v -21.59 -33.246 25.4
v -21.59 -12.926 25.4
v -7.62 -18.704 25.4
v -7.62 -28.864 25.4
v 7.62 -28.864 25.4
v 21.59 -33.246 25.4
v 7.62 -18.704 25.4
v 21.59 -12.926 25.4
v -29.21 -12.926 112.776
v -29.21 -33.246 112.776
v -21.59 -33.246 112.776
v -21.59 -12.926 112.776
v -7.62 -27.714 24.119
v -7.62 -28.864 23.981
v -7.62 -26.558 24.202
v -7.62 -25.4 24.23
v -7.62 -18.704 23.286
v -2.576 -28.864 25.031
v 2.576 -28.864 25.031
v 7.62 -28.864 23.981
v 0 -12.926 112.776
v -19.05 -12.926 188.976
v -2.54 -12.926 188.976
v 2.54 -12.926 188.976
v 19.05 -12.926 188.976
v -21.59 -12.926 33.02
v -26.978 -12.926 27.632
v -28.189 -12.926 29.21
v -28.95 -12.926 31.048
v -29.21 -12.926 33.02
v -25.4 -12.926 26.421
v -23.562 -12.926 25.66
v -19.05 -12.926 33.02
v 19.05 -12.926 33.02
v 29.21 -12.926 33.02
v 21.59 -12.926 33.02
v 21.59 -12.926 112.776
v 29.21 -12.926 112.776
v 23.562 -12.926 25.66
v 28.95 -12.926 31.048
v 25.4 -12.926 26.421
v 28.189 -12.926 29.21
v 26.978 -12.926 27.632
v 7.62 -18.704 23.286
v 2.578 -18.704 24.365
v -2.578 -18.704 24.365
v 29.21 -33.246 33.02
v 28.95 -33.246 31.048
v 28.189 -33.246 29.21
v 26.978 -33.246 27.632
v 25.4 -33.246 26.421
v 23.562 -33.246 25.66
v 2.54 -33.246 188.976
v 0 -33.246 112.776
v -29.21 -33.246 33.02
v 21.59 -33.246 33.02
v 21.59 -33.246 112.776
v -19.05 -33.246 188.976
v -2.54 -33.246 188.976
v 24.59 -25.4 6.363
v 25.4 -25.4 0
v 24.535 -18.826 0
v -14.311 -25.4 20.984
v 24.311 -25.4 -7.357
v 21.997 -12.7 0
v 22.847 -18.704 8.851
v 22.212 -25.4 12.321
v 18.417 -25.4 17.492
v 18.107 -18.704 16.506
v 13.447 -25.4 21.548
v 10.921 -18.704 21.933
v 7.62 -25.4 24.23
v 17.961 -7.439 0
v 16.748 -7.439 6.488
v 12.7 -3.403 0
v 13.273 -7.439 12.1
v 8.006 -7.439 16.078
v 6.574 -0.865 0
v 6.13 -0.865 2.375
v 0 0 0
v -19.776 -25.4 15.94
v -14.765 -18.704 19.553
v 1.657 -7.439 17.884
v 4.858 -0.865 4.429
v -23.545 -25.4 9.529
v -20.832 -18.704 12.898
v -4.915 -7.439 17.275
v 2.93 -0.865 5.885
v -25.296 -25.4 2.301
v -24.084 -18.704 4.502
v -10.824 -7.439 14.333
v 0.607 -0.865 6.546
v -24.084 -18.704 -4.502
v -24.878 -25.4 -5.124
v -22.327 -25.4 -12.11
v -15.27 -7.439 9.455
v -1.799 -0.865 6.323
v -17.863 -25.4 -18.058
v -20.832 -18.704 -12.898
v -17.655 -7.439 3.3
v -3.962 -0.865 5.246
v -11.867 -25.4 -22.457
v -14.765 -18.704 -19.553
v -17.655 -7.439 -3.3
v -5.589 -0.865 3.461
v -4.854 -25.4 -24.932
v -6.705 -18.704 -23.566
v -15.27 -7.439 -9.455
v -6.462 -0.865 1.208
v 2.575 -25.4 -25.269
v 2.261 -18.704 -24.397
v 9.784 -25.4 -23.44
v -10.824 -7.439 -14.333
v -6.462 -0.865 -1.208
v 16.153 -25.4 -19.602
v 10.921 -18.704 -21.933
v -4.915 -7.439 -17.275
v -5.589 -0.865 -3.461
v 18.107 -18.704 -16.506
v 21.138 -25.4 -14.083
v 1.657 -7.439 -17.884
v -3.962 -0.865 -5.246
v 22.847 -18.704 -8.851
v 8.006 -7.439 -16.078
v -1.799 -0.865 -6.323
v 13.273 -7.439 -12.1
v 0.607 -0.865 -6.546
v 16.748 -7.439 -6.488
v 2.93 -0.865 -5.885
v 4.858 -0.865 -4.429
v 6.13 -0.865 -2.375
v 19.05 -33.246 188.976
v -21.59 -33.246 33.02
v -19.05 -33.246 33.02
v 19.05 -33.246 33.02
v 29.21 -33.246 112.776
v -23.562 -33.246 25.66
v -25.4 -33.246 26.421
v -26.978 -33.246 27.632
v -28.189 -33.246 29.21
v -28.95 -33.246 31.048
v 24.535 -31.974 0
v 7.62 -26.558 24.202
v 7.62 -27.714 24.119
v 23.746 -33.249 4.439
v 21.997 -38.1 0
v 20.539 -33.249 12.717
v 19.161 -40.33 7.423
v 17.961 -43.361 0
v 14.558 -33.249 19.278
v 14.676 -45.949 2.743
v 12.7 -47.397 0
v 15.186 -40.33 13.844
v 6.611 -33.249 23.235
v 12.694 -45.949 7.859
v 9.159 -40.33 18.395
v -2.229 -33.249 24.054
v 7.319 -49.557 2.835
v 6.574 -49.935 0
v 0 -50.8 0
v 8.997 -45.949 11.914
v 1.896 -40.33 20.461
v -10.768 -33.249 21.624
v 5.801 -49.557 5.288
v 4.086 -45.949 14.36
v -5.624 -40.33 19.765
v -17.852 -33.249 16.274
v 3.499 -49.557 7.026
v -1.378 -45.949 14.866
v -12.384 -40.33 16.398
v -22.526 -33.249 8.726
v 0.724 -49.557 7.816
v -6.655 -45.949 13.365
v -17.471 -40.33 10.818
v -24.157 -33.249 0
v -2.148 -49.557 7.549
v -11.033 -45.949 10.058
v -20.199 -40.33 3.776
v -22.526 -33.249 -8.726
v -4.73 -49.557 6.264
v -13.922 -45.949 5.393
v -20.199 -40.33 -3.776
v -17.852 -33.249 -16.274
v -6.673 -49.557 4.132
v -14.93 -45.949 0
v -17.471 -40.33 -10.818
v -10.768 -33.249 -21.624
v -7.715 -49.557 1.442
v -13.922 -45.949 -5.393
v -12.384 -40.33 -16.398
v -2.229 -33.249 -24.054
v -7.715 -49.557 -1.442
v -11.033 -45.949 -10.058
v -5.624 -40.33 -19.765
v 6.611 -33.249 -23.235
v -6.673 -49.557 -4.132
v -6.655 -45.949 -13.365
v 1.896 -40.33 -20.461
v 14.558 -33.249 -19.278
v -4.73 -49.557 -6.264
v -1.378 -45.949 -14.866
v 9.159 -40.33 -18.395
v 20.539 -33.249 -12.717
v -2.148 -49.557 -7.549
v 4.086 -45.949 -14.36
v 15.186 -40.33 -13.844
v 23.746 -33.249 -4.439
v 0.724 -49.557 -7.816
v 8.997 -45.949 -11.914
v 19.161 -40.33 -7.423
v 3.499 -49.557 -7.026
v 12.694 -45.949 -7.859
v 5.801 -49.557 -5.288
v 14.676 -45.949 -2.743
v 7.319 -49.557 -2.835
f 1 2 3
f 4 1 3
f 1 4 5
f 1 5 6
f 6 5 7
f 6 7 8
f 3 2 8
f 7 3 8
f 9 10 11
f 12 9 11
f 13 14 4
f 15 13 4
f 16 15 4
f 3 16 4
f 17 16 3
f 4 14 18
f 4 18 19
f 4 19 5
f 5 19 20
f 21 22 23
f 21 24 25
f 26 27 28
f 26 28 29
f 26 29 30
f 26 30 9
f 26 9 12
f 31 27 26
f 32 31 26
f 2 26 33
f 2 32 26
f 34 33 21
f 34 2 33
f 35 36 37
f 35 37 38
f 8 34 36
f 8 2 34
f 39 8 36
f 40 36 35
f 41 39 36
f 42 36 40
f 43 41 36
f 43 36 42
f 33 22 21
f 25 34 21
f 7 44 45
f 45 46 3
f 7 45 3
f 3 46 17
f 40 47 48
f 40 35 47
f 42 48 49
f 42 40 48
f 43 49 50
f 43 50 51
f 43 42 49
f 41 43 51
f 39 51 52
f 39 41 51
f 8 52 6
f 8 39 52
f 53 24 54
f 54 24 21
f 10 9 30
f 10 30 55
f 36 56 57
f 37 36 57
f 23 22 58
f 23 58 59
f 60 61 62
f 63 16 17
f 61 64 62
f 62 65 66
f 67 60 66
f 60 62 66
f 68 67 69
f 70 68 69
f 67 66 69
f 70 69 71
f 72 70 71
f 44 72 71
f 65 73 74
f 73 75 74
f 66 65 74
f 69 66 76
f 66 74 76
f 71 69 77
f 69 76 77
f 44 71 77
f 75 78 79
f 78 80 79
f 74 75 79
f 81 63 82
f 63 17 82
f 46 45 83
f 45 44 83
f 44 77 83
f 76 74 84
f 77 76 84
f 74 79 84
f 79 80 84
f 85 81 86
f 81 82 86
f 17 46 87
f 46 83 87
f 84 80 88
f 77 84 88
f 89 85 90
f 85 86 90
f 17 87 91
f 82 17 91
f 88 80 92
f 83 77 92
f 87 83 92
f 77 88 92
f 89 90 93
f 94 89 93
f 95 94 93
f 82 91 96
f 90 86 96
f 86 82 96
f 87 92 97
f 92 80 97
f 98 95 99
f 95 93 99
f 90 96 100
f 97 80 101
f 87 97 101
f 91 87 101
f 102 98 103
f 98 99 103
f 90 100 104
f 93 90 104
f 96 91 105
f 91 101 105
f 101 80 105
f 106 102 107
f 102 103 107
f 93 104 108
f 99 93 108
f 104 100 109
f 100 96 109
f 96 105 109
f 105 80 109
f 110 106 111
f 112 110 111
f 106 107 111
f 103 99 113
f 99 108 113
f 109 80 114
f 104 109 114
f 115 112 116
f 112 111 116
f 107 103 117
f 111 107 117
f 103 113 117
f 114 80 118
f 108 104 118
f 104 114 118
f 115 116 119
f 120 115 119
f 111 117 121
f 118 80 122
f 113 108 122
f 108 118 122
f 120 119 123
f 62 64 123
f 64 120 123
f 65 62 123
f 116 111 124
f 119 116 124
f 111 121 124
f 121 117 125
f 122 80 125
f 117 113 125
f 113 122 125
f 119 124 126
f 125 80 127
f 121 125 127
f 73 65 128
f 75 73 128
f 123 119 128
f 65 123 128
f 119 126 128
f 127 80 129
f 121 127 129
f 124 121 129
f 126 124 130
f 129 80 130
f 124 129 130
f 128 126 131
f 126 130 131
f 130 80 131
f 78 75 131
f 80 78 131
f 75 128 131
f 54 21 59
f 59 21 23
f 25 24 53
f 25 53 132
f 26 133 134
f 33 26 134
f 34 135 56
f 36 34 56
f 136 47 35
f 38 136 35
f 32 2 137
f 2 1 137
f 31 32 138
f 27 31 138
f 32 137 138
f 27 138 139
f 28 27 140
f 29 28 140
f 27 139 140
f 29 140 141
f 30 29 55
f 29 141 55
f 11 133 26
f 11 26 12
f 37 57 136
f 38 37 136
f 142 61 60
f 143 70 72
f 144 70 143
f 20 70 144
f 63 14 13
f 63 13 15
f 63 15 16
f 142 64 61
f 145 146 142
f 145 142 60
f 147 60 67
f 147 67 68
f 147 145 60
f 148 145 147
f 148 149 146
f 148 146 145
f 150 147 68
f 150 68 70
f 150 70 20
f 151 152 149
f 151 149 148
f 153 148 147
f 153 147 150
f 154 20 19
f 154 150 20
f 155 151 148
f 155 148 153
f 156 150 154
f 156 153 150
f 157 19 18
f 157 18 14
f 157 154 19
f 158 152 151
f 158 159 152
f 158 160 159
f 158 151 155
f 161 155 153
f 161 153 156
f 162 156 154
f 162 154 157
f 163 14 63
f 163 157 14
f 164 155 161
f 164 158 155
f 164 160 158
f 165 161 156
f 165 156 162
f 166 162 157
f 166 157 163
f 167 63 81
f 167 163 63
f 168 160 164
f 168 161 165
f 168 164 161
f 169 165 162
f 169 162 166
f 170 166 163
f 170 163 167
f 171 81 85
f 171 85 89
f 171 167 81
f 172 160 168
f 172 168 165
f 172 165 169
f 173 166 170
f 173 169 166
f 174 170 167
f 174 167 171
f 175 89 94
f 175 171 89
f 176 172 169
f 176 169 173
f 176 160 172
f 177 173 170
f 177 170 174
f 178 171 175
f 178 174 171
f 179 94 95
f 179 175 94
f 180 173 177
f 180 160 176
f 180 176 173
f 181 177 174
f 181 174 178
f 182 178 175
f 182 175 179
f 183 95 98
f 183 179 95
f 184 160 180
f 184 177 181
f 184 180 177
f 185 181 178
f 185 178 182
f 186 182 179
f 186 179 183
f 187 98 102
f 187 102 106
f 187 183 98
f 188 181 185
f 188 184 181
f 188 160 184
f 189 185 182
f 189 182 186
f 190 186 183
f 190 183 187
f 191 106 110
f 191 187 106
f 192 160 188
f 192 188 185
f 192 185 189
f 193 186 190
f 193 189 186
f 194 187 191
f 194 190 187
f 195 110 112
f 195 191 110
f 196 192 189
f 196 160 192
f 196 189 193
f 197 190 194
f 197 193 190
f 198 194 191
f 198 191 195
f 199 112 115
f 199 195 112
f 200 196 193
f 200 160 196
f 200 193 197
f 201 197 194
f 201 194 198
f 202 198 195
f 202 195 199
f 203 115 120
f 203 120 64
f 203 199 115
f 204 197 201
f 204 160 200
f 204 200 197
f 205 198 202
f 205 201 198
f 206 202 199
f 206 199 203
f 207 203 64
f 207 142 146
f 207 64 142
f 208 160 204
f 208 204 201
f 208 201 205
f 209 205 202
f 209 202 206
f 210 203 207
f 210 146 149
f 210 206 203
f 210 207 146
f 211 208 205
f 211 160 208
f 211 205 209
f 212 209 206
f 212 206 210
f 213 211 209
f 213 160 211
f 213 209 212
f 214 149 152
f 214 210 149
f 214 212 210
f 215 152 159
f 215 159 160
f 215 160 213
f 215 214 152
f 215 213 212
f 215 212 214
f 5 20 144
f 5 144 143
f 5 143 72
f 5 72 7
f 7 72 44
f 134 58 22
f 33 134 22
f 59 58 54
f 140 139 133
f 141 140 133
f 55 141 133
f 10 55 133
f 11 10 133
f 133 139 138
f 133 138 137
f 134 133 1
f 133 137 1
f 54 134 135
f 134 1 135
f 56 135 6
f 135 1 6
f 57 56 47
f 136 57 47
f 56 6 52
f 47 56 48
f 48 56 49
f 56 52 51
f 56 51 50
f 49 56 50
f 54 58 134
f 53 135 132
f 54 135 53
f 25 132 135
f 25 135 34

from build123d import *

# Parameters (mm, degrees)
F0_R          = 25.4
F1_DEPTH      = 50.8
F2_R          = 25.4
F3_R          = 25.39999
F4_W          = 7.62
F4_H          = 10.16
F4_W_2        = 7.6200046011
F5_DEPTH      = 50.8
F6_W          = 21.59
F6_H          = 14.5421422695
F7_DEPTH      = 61.976
F7_DEPTH_BACK = 25.4
F8_R          = 7.62
F9_R          = 7.62
F10_W         = 2.54
F10_H         = 79.756
F11_DEPTH     = 25.4
F12_W         = 38.1
F12_H         = 20.32
F13_DEPTH     = 76.2
F15_DEPTH     = 25.4


# Not quite as in the source:
# - a fillet or chamfer is up to 0.001 mm smaller than in the source, because OpenCascade refuses the exact size


with BuildPart() as f1:
    # F0 (on Front) → F1 (new body)
    with BuildSketch(Plane.XZ):
        Circle(F0_R)
    extrude(amount=F1_DEPTH)

    # F2
    f2_edges = [f1.edges().sort_by_distance(p)[0] for p in [
        (-25.4, -50.8, 0),
    ]]
    fillet(f2_edges, radius=F2_R)

    # F3 (radius 25.4 in the source; OpenCascade refuses exactly that, so slightly less here)
    f3_edges = [f1.edges().sort_by_distance(p)[0] for p in [
        (-25.4, 0, 0),
    ]]
    fillet(f3_edges, radius=F3_R)

    # F4 (on Top) → F5 (join)
    with BuildSketch(Plane.XY):
        with Locations((3.81, -23.7836401282)):
            Rectangle(F4_W, F4_H)
        with Locations((-3.8100023006, -23.7836401282)):
            Rectangle(F4_W_2, F4_H)
    extrude(amount=F5_DEPTH)

    # F6 (on face) → F7 (join, two sides)
    with BuildSketch(Plane.XY.offset(50.8)) as f7_sk:
        Polygon((7.62, -33.2457823977), (7.62, -18.7036401282), (29.21, -18.7036401282), (29.21, -12.9257823977), (-29.21, -12.9257823977), (-29.21, -18.7036401282), (-29.21, -33.2457823977), align=None)
        with Locations((18.415, -25.9747112629)):
            Rectangle(F6_W, F6_H)
    extrude(amount=F7_DEPTH)
    extrude(f7_sk.sketch, amount=-F7_DEPTH_BACK)

    # F8
    f8_edges = [f1.edges().sort_by_distance(p)[0] for p in [
        (29.21, -23.085782, 25.4),
    ]]
    fillet(f8_edges, radius=F8_R)

    # F9
    f9_edges = [f1.edges().sort_by_distance(p)[0] for p in [
        (-29.21, -23.085782, 25.4),
    ]]
    fillet(f9_edges, radius=F9_R)

    # F10 (on face) → F11 (cut)
    with BuildSketch(Plane.XZ.offset(33.2457823977)):
        with Locations((20.32, 72.898)):
            Rectangle(F10_W, F10_H)
        with Locations((-20.32, 72.898)):
            Rectangle(F10_W, F10_H)
    extrude(amount=-F11_DEPTH, mode=Mode.SUBTRACT)

    # F12 (on face) → F13 (join)
    with BuildSketch(Plane.XY.offset(112.776)):
        with Locations((0, -23.0857823977)):
            Rectangle(F12_W, F12_H)
    extrude(amount=F13_DEPTH)

    # F14 (on face) → F15 (cut)
    with BuildSketch(Plane(origin=(0, -12.9257823977, 0), x_dir=(-1, 0, 0), z_dir=(0, 1, 0))):
        Polygon((-2.54, 188.976), (0, 112.776), (0, 188.976), align=None)
        Polygon((0, 188.976), (0, 112.776), (2.54, 188.976), align=None)
    extrude(amount=-F15_DEPTH, mode=Mode.SUBTRACT)


solid = f1.part
